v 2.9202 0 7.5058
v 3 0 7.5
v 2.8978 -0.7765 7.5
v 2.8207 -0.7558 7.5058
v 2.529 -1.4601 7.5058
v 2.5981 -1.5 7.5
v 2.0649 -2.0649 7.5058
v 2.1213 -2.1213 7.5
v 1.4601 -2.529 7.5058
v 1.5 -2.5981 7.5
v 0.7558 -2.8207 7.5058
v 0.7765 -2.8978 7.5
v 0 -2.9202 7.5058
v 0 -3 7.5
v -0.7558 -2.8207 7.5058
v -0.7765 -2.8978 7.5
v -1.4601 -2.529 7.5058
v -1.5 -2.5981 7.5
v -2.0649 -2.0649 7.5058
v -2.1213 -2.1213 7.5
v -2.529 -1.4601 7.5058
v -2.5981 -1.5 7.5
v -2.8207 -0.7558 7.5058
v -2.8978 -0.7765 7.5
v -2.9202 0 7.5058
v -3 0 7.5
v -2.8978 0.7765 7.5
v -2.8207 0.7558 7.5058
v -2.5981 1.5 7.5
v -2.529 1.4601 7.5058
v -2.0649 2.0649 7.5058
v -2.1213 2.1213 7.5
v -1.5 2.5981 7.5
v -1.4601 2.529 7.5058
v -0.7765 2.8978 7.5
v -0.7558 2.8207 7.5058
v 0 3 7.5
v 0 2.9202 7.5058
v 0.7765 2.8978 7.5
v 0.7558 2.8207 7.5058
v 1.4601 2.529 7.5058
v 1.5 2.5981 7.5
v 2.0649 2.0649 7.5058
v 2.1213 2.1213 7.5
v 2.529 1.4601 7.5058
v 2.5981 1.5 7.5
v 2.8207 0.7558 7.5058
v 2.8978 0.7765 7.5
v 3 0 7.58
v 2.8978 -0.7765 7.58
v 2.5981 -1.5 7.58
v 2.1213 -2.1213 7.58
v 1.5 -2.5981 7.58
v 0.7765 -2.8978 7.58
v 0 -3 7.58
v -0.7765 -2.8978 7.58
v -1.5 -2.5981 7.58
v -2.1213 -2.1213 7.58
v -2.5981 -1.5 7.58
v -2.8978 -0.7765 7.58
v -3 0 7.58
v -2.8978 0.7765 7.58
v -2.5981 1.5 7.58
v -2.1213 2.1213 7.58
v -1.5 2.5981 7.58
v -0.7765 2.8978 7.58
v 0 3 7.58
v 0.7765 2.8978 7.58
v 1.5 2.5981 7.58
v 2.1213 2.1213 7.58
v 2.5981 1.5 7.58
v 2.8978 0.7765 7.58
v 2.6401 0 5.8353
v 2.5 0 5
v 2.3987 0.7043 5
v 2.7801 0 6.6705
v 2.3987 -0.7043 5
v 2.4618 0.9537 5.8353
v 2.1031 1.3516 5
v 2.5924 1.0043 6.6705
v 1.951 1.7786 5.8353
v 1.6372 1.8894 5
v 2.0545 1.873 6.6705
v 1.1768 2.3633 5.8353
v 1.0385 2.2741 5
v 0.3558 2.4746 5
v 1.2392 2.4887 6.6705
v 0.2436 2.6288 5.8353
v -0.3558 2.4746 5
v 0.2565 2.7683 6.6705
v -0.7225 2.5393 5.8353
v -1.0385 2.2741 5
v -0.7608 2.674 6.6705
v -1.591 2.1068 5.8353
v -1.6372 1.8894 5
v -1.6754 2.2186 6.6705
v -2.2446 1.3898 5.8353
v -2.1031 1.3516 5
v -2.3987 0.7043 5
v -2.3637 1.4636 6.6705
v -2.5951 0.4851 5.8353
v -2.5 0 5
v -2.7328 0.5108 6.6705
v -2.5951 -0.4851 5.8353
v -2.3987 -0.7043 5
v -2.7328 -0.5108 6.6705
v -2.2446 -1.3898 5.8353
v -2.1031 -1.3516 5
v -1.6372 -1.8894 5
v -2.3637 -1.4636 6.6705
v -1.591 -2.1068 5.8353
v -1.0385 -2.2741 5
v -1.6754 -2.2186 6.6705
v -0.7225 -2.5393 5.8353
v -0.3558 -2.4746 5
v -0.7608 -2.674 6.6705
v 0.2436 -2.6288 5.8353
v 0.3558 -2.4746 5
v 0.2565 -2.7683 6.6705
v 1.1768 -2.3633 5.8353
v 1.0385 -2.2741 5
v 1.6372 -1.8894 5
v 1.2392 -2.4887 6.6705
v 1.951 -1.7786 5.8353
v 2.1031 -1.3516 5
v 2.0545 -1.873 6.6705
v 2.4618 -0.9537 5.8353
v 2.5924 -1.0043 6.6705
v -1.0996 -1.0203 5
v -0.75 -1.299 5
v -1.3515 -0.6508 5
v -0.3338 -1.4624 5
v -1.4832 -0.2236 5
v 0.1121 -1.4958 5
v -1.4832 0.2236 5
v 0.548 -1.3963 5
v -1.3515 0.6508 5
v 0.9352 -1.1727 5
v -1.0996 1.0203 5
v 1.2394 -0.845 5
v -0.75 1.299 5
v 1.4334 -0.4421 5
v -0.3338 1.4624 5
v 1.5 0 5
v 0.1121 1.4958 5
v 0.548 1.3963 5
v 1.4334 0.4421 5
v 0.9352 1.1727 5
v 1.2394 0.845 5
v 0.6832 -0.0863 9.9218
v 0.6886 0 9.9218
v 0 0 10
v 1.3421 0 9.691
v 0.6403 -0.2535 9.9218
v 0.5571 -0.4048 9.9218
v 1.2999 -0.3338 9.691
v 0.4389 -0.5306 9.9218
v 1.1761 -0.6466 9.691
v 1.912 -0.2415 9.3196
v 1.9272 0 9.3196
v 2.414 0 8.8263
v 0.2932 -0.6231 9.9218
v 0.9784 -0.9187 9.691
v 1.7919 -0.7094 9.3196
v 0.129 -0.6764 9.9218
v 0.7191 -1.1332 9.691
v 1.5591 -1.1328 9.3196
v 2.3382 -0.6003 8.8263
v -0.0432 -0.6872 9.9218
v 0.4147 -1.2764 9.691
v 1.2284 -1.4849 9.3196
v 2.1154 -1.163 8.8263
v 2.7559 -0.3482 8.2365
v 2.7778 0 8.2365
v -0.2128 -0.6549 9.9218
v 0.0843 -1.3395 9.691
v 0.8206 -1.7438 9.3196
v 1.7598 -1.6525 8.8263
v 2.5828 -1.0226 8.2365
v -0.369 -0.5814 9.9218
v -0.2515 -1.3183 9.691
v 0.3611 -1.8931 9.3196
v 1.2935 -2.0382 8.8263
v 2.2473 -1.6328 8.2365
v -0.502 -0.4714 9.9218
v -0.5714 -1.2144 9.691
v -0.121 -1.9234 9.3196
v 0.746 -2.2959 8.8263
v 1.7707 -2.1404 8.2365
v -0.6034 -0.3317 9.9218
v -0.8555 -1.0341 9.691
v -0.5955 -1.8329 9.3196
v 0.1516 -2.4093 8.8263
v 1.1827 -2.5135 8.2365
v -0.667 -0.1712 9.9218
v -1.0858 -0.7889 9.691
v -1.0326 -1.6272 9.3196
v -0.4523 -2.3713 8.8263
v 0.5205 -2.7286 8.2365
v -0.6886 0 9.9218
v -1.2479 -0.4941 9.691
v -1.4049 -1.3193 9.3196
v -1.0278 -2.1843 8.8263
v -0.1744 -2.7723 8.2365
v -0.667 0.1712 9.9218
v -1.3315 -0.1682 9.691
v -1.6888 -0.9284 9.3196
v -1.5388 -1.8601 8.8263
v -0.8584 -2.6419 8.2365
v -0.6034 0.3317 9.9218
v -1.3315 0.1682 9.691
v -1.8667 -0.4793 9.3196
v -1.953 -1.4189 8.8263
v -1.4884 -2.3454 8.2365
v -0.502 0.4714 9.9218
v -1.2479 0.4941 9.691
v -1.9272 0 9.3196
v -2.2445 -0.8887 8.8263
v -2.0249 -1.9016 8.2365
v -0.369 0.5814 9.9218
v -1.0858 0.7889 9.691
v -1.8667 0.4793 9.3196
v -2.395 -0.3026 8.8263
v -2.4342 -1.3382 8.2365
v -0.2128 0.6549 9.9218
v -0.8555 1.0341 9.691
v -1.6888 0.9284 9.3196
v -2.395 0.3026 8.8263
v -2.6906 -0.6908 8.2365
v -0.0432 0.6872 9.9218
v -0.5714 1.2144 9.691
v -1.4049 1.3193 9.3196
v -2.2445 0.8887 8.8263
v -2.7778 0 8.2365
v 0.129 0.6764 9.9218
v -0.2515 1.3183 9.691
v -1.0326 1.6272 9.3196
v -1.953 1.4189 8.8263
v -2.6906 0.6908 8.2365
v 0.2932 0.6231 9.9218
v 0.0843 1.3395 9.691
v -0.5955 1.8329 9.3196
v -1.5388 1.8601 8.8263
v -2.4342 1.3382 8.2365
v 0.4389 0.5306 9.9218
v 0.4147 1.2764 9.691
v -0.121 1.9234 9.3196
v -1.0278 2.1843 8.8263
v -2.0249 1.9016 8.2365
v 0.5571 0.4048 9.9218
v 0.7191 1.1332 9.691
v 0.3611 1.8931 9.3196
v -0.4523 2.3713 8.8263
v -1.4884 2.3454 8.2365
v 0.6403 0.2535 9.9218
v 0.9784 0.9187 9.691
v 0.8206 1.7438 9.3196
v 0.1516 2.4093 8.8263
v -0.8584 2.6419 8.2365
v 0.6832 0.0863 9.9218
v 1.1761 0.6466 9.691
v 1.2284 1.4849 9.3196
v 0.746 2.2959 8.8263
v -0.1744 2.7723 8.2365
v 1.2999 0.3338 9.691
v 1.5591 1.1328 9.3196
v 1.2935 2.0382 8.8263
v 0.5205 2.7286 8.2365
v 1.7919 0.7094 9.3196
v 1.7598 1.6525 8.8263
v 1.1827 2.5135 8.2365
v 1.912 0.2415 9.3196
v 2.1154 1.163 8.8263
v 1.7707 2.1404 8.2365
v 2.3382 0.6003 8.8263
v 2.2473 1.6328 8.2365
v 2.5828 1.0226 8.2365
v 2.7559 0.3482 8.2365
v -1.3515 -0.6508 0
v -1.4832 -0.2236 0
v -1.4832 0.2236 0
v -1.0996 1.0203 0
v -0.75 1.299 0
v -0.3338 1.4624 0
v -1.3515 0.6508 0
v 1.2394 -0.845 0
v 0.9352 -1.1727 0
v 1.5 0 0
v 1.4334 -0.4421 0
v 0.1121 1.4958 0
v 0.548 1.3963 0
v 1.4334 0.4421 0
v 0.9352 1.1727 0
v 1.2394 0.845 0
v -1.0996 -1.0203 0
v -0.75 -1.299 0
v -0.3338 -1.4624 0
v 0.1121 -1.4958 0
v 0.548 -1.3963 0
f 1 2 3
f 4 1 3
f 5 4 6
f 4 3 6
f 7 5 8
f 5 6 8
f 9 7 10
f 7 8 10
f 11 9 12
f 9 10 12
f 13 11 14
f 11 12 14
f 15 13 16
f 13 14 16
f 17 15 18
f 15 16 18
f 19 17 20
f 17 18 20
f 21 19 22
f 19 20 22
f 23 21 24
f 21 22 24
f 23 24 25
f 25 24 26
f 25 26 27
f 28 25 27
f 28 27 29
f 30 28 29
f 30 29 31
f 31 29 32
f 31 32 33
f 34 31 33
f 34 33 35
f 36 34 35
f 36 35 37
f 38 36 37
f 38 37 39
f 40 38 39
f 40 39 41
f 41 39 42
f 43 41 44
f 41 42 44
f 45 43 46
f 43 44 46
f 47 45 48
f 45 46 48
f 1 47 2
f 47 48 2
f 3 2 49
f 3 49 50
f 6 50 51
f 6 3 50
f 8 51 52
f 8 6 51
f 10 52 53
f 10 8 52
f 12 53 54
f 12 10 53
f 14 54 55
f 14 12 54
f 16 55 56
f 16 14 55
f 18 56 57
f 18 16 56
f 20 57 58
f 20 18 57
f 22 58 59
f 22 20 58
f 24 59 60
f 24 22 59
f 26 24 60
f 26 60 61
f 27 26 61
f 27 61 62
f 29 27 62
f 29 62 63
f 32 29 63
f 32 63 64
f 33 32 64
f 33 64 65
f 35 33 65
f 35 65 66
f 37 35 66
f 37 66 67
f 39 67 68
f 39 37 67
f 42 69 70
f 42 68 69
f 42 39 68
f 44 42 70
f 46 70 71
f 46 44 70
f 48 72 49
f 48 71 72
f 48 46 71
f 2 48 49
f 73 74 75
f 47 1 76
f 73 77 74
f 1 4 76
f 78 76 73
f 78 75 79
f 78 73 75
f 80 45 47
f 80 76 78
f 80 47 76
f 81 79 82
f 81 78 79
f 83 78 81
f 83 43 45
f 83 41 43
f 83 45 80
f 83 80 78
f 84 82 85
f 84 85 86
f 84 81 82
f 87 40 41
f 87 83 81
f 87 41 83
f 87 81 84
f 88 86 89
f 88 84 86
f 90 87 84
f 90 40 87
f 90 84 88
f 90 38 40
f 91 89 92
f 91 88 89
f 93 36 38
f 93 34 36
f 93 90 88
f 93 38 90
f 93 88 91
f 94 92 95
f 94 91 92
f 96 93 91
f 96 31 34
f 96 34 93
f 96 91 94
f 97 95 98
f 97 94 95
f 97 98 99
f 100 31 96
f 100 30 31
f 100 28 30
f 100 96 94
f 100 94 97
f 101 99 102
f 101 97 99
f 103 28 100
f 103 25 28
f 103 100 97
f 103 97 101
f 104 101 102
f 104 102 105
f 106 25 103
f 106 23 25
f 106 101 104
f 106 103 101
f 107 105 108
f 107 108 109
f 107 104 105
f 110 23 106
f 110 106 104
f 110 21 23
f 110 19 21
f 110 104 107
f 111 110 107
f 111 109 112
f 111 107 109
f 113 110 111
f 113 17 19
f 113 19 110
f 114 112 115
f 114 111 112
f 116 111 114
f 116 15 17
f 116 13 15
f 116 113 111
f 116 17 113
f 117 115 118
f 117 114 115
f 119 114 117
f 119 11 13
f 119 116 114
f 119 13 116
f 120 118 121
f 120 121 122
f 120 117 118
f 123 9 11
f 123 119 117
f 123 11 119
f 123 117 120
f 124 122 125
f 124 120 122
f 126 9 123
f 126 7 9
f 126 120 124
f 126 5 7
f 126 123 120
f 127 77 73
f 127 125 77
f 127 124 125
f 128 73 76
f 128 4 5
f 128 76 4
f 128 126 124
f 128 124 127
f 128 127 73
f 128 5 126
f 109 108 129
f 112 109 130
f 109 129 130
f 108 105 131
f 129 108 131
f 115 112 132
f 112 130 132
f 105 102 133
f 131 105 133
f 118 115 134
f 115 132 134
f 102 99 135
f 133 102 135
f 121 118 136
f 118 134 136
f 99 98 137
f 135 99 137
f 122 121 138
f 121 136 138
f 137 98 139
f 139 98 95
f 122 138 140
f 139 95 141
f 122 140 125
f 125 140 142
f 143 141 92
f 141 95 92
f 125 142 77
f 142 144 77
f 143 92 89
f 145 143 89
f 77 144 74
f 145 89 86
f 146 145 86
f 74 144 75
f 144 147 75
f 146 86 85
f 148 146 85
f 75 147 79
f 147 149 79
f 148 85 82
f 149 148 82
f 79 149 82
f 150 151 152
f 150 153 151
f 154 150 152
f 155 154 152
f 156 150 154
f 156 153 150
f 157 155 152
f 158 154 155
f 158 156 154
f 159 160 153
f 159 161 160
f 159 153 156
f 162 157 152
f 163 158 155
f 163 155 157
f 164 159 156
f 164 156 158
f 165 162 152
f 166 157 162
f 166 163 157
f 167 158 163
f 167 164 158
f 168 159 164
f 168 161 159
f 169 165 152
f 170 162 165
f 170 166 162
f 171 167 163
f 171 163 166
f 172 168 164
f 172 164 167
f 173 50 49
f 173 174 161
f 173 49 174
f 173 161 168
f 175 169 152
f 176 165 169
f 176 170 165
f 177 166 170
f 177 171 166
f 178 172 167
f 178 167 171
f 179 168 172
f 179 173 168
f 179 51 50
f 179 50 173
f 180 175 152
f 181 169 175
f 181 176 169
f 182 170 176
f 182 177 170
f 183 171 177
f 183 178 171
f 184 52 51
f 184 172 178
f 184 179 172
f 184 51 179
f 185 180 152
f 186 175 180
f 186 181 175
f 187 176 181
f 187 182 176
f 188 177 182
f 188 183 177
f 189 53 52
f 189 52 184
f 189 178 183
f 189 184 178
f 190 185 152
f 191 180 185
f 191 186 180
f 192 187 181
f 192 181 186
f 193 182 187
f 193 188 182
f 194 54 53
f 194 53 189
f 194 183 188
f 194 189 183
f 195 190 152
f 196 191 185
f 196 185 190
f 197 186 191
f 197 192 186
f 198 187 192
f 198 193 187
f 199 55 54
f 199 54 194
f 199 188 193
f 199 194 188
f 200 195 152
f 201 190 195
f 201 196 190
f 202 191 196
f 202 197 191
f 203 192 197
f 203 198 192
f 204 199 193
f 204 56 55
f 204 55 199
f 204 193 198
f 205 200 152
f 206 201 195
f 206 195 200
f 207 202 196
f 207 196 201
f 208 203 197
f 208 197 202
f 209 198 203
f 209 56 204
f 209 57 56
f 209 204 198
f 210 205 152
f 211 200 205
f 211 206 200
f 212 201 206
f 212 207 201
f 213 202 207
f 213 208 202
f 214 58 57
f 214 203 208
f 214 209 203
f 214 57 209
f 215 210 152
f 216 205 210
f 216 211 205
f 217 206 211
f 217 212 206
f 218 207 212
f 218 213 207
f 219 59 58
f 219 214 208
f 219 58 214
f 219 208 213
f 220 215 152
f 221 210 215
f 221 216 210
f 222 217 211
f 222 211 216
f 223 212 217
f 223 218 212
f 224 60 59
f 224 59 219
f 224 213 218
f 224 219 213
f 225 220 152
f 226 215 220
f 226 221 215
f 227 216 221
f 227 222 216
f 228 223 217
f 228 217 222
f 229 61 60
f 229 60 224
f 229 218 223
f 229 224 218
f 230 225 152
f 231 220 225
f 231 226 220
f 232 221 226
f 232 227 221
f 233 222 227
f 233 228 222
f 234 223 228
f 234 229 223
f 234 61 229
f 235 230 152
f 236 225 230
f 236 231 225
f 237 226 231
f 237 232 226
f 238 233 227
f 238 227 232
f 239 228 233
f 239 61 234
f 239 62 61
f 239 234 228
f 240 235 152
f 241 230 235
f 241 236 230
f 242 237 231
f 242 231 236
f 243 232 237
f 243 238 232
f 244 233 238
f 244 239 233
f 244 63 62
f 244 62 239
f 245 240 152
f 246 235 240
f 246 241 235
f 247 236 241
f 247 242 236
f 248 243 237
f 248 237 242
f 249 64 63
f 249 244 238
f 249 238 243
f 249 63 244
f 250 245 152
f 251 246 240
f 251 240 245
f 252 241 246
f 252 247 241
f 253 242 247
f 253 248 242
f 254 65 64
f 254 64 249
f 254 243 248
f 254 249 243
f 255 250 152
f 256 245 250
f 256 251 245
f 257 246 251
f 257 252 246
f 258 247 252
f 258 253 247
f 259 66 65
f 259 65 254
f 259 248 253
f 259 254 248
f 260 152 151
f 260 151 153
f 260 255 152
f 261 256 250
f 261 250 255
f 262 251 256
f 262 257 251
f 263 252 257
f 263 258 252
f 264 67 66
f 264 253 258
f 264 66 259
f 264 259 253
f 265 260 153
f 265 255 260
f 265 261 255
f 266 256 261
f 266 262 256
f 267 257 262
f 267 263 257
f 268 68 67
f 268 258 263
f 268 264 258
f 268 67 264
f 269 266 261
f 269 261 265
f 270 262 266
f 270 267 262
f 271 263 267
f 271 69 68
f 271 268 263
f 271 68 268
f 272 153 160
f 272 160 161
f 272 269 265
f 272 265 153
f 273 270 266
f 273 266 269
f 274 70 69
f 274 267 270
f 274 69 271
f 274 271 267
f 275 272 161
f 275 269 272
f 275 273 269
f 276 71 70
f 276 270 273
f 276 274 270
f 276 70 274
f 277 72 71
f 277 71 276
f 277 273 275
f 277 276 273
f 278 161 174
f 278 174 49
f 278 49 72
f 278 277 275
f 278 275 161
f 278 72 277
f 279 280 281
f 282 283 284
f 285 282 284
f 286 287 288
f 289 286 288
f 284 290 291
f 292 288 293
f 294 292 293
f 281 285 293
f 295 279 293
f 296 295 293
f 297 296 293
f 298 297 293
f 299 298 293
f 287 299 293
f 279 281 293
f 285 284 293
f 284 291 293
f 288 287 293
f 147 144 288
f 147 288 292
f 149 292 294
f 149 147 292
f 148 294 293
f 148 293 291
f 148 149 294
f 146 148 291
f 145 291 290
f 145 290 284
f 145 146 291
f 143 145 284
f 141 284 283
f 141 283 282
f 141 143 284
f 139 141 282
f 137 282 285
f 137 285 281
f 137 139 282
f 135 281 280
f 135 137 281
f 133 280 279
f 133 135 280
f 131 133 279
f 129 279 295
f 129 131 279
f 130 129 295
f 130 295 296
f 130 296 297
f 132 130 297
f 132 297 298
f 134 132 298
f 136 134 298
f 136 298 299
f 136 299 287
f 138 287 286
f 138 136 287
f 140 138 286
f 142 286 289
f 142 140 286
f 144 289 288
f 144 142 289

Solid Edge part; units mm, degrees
sketch "Sketch1" plane through (0, 0, 0) normal (0, -1, 0) x (1, 0, 0)
  arc A0 (0, 10) -> (3, 7.58) centre (0, 6.9305) cw
  line L0 (3, 7.58) -> (3, 7.5)
  line L1 (3, 7.5) -> (2.9202, 7.5058)
  line L2 (2.9202, 7.5058) -> (2.5, 5)
  line L3 (1.5, 5) -> (2.5, 5)
  line L4 (1.5, 0) -> (1.5, 5)
  line L5 (0, 0) -> (1.5, 0)
  line L6 (0, 0) -> (0, 10)
revolve "RevolvedProtrusion1" add sketch "Sketch1" angle 360 about axis through (0, 0, 0) along (0, 0, 1)
properties material "Tantalum"
